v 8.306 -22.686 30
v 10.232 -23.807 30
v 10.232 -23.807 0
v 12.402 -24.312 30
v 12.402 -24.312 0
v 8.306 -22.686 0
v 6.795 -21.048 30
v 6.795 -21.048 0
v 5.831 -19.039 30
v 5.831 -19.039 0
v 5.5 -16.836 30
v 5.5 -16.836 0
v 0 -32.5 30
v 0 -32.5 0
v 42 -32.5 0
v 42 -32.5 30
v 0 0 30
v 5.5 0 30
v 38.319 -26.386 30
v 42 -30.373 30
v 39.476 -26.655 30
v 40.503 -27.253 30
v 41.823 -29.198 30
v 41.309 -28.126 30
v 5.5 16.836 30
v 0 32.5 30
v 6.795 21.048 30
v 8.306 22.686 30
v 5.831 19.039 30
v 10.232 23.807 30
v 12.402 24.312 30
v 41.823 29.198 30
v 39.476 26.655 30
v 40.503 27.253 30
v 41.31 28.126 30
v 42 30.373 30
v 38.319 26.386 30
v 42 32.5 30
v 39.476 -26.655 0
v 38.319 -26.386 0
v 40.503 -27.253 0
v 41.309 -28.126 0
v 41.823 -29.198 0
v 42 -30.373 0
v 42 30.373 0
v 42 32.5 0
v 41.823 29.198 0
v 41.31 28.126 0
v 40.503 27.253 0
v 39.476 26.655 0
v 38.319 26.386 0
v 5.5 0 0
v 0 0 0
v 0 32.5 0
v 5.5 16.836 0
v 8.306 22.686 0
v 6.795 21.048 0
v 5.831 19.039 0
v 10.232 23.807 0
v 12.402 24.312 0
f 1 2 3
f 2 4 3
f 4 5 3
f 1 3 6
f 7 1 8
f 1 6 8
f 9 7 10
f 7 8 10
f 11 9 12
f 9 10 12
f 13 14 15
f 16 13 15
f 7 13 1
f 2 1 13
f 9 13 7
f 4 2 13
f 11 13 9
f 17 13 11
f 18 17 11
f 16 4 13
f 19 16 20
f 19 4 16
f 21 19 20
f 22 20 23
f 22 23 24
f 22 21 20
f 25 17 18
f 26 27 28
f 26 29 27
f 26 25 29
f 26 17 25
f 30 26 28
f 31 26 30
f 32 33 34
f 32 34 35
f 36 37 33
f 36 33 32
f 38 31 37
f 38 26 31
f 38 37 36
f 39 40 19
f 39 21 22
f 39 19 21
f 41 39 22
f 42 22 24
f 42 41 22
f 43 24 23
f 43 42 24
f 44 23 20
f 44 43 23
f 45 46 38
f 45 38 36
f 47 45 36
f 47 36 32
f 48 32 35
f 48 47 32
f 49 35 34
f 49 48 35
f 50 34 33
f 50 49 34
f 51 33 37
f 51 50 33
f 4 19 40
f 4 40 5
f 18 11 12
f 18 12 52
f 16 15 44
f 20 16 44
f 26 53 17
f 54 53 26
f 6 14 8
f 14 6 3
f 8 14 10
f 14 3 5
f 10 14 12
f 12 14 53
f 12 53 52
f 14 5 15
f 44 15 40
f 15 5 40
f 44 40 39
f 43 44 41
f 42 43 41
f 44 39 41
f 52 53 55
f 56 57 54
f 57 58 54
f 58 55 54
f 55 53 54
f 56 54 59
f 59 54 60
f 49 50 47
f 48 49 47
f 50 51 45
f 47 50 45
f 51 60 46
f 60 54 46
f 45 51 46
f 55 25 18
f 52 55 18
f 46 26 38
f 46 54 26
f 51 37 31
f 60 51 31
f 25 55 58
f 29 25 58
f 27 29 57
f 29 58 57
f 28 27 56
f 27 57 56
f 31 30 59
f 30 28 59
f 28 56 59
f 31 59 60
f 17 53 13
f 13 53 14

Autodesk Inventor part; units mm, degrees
ref_plane "YZ Plane" through (0, 0, 0) normal (1, 0, 0) x (0, 1, 0)
ref_plane "Начальная плоскость" through (0, 0, 0) normal (0, 0, 1) x (1, 0, 0)
ref_plane "Конечная плоскость" through (0, 0, 30) normal (0, 0, 1) x (1, 0, 0)
sketch "Эскиз" plane through (0, 0, 0) normal (0, 0, 1) x (1, 0, 0)
  line L0 (0, 0) -> (0, 32.5)
  line L1 (0, 32.5) -> (42, 32.5)
  line L2 (42, 32.5) -> (42, 30.3728)
  line L3 (38.319, 26.3855) -> (12.4019, 24.3122)
  line L4 (5.5, 16.836) -> (5.5, 0)
  line L5 (5.5, 0) -> (0, 0) construction
  line L6 (21, 32.5) -> (21, 25) construction
  line L7 (42, 26.68) -> (42, 25) construction
  line L8 (42, 25) -> (21, 25) construction
  line L9 (0, 15) -> (0, -27) construction
  line L10 (-5.539, 0) -> (16.0067, 0) construction
  line L11 (0, 0) -> (0, -32.5)
  line L12 (0, -32.5) -> (42, -32.5)
  line L13 (42, -32.5) -> (42, -30.3728)
  line L14 (38.319, -26.3855) -> (12.4019, -24.3122)
  line L15 (5.5, -16.836) -> (5.5, 0)
  arc A0 (12.4019, 24.3122) -> (5.5, 16.836) centre (13, 16.836) ccw
  arc A1 (5.5, -16.836) -> (12.4019, -24.3122) centre (13, -16.836) ccw
  arc A2 (38.319, 26.3855) -> (42, 30.3728) centre (38, 30.3728) ccw
  arc A3 (42, -30.3728) -> (38.319, -26.3855) centre (38, -30.3728) ccw
  line L16 (0, 35.4) -> (0, -37.4) construction
  line L17 (-11.7637, 0) -> (31.8094, 0) construction
  point P0 (5.5, 23.76)
  point P1 (42, -26.68)
  point P2 (5.5, -23.76)
  point P3 (21, -32.5)
  point P4 (21, -25)
  dimension "d0" = 5.5
  dimension "d1" = 32.5
  dimension "d2" = 42
  dimension "d3" = 7.5
  dimension "d4" = 21
  dimension "d5" = 1.68
  dimension "d23" = 7.5
  dimension "d24" = 4
  dimension "d25" = 0
extrude "Базовый элемент" add sketch "Эскиз" along normal up to surface (30 mm away) from surface at 0
sketch "Sketch3" plane through (0, 0, 0) normal (0, 0, 1) x (1, 0, 0)
  line L0 (0, 0) -> (10, 0)
ref_plane "Work Plane3" through (0, 0, 0) normal (0, -1, 0) x (1, 0, 0)
sketch "Sketch4" plane through (0, 0, 0) normal (0, -1, 0) x (1, 0, 0)
  line L0 (-2, 0) -> (12, 0) projected
  line L1 (-2, 30) -> (12, 30) projected
  dimension "d29" = 30
equation "\"d0\" = G_T"
equation "\"d1\" = 0.5 * G_H"
equation "\"d2\" = G_W"
equation "\"d3\" = G_T1"
equation "\"d4\" = G_C"
equation "\"d23\" = G_IR"
equation "\"d24\" = G_ER"
equation "\"d6\" = G_L"
equation "\"G_W\" = 42"
equation "\"G_H\" = 65"
equation "\"G_T\" = 5.5"
equation "\"G_T1\" = 7.5"
equation "\"G_NG\" = 0.08"
equation "\"G_ER\" = 4"
equation "\"G_IR\" = 7.5"
equation "\"G_C\" = 21"
equation "\"G_L\" = d29"
equation "\"ex\" = 0"
equation "\"G_OFFSET_START\" = 0"
equation "\"G_OFFSET_END\" = 0"
properties part number "DIN1026-1 - U 65 - 30" material "Сталь, мягкая"
